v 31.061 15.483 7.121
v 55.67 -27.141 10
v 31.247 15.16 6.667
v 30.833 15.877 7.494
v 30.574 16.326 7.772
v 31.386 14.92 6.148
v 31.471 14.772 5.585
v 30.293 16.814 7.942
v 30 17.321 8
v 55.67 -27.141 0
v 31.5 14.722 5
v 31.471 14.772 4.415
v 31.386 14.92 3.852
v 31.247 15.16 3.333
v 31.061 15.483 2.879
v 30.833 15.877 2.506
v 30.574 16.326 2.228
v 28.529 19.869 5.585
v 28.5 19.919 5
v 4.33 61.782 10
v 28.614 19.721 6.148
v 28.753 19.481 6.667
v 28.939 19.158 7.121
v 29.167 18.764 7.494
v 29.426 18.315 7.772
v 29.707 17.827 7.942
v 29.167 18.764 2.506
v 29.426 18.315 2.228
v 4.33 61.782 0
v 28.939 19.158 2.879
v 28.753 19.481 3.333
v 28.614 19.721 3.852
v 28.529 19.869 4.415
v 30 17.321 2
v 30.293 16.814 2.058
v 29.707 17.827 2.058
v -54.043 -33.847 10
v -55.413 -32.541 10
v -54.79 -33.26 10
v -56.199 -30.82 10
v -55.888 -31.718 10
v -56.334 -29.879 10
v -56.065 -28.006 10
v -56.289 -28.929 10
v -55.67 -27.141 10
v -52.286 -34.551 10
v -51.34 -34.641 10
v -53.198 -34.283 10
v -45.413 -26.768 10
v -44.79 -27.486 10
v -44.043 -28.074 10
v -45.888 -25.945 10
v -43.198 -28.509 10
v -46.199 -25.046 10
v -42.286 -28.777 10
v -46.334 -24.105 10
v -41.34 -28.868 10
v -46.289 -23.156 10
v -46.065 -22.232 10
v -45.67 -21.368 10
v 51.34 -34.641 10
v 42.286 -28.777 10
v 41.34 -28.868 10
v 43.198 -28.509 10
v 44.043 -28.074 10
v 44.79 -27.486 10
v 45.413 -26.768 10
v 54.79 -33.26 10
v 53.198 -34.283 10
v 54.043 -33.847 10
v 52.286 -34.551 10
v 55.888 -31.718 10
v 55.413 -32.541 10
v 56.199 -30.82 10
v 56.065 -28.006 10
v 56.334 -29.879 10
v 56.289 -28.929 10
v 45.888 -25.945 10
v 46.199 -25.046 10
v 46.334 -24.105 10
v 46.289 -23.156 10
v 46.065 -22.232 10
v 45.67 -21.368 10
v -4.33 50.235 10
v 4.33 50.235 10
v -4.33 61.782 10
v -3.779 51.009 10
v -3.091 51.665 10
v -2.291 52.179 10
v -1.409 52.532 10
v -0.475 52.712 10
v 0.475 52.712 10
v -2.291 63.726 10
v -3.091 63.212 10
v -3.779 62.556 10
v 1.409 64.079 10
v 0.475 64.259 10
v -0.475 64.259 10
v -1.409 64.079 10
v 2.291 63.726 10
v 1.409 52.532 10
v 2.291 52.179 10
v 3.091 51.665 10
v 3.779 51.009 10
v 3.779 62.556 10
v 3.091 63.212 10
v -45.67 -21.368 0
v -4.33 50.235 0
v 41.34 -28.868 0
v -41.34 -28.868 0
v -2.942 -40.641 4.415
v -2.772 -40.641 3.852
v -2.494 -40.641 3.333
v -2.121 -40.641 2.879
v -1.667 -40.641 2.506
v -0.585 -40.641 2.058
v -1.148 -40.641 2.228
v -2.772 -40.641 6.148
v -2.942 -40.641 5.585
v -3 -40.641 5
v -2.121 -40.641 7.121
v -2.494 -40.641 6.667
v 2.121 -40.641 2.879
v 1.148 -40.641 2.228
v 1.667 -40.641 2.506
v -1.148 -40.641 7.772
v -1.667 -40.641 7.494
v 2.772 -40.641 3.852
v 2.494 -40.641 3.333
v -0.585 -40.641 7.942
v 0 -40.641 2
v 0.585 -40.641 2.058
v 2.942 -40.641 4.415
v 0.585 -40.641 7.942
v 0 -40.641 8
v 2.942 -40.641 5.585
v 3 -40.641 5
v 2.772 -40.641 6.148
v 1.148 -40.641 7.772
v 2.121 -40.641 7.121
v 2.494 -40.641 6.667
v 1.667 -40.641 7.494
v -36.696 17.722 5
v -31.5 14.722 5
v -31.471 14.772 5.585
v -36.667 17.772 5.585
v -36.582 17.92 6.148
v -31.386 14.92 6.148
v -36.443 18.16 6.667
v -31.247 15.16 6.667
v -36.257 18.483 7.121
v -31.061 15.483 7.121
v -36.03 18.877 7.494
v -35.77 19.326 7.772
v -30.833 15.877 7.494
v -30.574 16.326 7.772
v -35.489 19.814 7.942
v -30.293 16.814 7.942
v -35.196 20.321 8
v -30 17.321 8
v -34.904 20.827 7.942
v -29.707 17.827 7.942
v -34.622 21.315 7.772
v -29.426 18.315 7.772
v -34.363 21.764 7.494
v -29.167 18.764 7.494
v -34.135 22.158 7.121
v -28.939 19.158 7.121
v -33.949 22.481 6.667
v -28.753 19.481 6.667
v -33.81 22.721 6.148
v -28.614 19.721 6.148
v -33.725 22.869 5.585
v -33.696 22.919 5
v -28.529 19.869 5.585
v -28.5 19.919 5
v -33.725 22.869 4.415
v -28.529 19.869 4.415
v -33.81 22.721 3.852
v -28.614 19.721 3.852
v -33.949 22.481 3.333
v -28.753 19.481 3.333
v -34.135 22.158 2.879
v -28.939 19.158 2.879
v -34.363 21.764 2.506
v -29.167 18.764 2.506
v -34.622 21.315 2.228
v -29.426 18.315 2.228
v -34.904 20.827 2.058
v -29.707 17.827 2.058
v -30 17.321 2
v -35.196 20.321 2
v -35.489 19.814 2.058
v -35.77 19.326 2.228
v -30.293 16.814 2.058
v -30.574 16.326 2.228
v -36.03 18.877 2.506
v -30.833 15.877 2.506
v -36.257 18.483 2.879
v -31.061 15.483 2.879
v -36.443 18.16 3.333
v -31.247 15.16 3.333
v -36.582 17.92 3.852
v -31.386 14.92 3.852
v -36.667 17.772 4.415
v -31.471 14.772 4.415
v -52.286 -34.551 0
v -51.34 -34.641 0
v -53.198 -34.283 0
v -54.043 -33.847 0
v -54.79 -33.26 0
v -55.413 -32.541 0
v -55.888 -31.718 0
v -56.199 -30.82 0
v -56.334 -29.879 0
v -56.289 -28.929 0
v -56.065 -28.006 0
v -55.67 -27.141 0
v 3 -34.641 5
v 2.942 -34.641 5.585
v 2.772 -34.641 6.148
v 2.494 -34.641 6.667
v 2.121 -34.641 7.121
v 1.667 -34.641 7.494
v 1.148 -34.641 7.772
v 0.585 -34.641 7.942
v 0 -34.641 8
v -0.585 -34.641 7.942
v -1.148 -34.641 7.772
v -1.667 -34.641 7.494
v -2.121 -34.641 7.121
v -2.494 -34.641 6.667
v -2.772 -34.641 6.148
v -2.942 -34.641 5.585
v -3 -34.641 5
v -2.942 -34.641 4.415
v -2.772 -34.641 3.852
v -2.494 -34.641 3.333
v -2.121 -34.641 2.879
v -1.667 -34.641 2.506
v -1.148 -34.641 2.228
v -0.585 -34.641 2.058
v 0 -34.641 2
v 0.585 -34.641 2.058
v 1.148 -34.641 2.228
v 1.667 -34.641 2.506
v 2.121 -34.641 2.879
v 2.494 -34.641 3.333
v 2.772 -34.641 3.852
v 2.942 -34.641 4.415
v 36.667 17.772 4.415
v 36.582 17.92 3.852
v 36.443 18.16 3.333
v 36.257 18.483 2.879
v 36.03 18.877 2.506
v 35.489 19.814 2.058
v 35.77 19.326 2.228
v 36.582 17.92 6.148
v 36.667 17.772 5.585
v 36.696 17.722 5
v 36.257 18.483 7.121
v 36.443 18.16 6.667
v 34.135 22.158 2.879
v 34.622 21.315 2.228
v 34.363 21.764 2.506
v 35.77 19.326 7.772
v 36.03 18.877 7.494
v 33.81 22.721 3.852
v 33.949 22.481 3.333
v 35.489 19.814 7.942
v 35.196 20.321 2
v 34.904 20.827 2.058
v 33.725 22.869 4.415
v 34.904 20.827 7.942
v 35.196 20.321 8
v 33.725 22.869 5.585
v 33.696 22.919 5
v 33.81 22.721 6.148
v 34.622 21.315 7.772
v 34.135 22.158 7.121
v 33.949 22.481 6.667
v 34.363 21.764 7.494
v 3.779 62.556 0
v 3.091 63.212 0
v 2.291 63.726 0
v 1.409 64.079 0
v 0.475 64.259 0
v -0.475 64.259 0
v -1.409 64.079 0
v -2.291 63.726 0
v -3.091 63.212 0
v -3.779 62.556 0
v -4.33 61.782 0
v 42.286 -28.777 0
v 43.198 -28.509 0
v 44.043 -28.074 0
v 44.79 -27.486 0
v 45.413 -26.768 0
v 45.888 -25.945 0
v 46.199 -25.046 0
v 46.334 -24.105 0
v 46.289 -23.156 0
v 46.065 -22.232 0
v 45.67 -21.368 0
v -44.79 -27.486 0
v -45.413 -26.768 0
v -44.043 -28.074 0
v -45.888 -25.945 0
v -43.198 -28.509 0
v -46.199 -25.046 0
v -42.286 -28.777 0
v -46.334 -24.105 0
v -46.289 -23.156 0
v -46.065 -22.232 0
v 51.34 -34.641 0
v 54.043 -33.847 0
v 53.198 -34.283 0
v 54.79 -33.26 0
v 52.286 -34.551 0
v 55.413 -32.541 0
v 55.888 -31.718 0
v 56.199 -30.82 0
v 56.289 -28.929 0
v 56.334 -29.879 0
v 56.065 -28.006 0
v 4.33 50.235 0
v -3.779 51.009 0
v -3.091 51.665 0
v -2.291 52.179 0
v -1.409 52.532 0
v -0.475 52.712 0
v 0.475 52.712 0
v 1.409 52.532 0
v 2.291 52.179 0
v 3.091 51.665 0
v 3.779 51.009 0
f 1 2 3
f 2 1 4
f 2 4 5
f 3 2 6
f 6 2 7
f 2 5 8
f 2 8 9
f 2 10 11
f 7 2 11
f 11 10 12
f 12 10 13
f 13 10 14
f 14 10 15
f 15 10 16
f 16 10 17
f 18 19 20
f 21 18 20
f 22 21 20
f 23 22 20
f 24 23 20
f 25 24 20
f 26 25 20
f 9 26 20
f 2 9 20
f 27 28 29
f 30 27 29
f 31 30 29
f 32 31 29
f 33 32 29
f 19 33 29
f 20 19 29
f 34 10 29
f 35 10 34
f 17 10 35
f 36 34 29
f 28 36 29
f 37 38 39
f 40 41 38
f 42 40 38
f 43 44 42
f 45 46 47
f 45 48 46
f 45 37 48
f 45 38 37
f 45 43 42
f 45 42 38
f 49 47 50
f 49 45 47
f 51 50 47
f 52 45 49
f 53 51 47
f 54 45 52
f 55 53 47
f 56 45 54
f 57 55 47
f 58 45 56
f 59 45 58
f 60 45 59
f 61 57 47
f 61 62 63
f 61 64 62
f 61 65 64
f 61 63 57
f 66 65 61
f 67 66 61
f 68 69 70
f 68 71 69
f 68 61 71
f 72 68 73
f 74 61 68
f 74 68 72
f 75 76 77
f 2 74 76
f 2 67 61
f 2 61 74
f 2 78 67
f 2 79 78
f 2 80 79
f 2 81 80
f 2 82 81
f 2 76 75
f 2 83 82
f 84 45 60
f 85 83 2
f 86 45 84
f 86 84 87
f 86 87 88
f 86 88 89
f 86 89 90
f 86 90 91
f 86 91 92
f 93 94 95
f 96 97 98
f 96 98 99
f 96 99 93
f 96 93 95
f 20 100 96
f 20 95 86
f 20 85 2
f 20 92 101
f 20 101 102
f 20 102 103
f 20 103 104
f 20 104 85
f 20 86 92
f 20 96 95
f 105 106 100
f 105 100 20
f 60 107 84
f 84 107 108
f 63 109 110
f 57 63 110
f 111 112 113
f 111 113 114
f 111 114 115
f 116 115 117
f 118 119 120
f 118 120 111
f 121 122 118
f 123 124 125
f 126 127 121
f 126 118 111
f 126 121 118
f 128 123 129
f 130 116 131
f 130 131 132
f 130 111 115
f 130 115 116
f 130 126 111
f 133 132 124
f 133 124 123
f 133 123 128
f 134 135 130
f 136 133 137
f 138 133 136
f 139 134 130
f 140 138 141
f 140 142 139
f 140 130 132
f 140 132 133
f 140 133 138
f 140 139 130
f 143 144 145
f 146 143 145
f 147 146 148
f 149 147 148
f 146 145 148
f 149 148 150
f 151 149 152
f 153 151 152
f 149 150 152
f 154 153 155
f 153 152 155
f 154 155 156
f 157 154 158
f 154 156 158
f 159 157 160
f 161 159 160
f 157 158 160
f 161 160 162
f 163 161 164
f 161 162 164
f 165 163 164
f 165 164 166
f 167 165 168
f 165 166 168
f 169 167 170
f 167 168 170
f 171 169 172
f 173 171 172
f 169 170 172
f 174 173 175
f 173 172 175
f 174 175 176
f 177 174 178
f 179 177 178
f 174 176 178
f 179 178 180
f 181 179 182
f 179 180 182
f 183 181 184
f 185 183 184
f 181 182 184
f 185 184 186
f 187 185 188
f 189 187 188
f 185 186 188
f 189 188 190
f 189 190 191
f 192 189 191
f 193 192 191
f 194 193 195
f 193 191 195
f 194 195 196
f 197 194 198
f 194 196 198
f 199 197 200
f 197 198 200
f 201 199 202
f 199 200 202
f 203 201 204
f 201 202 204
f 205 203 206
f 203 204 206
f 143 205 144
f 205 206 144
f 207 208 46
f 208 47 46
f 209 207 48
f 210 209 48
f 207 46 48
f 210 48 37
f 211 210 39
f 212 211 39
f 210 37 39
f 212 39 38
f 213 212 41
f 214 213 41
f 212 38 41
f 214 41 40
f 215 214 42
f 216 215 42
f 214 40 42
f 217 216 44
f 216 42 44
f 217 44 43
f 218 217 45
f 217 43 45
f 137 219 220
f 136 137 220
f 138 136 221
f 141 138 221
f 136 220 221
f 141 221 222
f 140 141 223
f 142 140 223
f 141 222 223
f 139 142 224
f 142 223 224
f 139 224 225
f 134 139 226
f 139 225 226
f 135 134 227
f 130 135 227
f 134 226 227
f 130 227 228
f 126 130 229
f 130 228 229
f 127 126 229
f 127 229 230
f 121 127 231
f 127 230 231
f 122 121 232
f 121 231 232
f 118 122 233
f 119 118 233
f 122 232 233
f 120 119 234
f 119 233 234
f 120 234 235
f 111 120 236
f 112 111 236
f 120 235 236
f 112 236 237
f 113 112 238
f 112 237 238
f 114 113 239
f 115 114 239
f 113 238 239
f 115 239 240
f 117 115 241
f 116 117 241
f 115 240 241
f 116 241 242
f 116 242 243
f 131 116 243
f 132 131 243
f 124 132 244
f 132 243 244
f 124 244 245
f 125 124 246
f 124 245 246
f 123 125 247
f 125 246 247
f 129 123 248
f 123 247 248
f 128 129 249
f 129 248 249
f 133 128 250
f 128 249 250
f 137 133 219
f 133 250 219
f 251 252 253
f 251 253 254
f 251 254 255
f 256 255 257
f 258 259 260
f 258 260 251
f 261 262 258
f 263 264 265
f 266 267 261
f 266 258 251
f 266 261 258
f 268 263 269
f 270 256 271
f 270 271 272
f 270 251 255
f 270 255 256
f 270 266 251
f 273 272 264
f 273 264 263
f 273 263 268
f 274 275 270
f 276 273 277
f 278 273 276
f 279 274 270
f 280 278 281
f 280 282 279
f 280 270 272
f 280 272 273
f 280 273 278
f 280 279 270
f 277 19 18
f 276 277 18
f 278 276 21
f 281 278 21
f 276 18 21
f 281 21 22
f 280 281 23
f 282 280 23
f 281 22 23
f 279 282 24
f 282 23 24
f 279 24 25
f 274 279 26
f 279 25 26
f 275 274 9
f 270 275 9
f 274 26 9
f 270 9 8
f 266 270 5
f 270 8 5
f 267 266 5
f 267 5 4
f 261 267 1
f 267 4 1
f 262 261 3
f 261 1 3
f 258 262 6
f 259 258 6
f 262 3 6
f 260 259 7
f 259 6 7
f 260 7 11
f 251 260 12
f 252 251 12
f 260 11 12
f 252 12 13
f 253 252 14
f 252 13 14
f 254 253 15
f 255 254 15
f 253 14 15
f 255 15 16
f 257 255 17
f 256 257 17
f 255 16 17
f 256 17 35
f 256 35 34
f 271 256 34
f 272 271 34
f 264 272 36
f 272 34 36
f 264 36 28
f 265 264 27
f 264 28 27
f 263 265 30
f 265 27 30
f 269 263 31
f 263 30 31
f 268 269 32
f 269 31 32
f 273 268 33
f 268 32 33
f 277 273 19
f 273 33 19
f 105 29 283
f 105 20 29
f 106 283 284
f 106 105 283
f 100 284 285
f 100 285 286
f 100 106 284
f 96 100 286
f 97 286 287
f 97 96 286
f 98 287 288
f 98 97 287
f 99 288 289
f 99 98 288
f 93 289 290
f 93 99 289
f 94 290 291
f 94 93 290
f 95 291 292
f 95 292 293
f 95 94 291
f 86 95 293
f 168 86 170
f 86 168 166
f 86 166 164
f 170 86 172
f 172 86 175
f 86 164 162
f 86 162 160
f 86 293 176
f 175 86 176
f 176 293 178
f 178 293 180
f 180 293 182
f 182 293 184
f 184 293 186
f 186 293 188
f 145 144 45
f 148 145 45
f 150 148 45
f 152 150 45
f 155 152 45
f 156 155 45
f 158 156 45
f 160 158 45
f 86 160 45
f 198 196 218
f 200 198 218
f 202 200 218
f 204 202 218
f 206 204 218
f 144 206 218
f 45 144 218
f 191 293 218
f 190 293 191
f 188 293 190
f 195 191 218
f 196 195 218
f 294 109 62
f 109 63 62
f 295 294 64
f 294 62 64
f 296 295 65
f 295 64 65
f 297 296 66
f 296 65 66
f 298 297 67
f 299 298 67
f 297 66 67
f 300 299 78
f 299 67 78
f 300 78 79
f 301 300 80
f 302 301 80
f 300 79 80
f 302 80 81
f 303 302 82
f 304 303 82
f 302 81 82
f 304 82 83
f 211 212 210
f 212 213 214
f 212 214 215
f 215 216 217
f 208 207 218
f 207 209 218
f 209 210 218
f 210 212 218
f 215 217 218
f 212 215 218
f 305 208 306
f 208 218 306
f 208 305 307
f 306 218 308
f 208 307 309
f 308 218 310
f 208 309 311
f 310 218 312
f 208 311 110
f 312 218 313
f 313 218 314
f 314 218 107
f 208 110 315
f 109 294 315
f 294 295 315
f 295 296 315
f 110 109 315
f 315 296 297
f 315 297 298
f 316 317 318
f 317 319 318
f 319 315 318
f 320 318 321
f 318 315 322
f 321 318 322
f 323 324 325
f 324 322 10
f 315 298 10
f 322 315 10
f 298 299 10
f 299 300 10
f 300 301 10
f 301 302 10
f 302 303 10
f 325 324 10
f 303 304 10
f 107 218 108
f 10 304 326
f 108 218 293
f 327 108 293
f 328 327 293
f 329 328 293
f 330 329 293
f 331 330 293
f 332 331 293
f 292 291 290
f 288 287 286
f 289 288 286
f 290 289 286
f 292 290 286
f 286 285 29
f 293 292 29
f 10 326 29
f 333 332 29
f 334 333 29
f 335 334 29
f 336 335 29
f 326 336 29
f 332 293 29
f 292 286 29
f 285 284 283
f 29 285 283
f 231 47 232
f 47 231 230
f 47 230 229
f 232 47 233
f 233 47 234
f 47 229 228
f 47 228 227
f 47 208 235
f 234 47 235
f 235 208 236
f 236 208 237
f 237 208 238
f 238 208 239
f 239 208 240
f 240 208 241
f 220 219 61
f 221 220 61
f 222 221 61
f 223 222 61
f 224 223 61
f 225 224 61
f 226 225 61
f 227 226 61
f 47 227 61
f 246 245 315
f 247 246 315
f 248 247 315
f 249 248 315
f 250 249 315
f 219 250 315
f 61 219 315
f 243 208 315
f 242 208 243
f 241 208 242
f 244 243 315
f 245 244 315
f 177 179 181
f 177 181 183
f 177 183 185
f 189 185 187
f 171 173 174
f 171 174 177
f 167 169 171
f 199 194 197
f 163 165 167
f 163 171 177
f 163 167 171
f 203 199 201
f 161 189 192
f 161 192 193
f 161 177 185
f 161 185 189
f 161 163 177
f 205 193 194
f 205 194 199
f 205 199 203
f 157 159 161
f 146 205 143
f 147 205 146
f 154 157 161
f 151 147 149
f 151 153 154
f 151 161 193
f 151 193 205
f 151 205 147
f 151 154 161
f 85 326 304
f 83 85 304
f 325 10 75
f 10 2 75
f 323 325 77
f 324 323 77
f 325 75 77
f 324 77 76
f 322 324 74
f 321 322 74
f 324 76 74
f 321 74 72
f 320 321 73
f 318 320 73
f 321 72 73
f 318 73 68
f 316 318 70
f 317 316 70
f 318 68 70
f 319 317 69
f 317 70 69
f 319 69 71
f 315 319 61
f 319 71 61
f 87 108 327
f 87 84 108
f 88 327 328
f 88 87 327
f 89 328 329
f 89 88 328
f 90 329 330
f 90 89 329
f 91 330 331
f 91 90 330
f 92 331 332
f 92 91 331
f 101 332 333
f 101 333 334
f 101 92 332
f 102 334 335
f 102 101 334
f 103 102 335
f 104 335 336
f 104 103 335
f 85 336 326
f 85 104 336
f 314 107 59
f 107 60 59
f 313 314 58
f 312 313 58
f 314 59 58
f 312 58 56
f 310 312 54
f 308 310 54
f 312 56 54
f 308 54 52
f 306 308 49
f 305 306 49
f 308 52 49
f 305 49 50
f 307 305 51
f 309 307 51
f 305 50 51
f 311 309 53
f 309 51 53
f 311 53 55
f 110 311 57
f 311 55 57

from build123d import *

# Parameters (mm, degrees)
F1_DEPTH        = 10
F2_R            = 5
F3_R            = 3
F4_DEPTH        = 6
F4_COPIES_COUNT = 3


# Not quite as in the source:
# - a pattern or mirror of a feature is missing from the dataset's text; its kind, count and spacing are read off the source's solid


with BuildPart() as f1:
    # F0 (on Top) → F1 (new body)
    with BuildSketch(Plane.XY):
        Polygon((60, -34.6410161514), (0, 69.2820323028), (-60, -34.6410161514), align=None)
        Polygon((0, 57.735026919), (50, -28.8675134595), (-50, -28.8675134595), align=None, mode=Mode.SUBTRACT)
    extrude(amount=F1_DEPTH)

    # F2
    f2_edges = [f1.edges().sort_by_distance(p)[0] for p in [
        (-60, -34.641016, 5),
        (60, -34.641016, 5),
        (0, 69.282032, 5),
        (50, -28.867513, 5),
        (0, 57.735027, 5),
        (-50, -28.867513, 5),
    ]]
    fillet(f2_edges, radius=F2_R)

    # F3 (on face) → F4 (join)
    with BuildSketch(Plane.XZ.offset(34.6410161514)):
        with Locations((0, 5)):
            Circle(F3_R)
    f4 = extrude(amount=F4_DEPTH)

    # F4_copies: F4 ×3 about axis
    f4_copies_axis = Axis((0, 0, 0), (0, 0, 1))
    for i in range(1, F4_COPIES_COUNT):
        add(f4.rotate(f4_copies_axis, i * 360 / F4_COPIES_COUNT))


solid = f1.part
